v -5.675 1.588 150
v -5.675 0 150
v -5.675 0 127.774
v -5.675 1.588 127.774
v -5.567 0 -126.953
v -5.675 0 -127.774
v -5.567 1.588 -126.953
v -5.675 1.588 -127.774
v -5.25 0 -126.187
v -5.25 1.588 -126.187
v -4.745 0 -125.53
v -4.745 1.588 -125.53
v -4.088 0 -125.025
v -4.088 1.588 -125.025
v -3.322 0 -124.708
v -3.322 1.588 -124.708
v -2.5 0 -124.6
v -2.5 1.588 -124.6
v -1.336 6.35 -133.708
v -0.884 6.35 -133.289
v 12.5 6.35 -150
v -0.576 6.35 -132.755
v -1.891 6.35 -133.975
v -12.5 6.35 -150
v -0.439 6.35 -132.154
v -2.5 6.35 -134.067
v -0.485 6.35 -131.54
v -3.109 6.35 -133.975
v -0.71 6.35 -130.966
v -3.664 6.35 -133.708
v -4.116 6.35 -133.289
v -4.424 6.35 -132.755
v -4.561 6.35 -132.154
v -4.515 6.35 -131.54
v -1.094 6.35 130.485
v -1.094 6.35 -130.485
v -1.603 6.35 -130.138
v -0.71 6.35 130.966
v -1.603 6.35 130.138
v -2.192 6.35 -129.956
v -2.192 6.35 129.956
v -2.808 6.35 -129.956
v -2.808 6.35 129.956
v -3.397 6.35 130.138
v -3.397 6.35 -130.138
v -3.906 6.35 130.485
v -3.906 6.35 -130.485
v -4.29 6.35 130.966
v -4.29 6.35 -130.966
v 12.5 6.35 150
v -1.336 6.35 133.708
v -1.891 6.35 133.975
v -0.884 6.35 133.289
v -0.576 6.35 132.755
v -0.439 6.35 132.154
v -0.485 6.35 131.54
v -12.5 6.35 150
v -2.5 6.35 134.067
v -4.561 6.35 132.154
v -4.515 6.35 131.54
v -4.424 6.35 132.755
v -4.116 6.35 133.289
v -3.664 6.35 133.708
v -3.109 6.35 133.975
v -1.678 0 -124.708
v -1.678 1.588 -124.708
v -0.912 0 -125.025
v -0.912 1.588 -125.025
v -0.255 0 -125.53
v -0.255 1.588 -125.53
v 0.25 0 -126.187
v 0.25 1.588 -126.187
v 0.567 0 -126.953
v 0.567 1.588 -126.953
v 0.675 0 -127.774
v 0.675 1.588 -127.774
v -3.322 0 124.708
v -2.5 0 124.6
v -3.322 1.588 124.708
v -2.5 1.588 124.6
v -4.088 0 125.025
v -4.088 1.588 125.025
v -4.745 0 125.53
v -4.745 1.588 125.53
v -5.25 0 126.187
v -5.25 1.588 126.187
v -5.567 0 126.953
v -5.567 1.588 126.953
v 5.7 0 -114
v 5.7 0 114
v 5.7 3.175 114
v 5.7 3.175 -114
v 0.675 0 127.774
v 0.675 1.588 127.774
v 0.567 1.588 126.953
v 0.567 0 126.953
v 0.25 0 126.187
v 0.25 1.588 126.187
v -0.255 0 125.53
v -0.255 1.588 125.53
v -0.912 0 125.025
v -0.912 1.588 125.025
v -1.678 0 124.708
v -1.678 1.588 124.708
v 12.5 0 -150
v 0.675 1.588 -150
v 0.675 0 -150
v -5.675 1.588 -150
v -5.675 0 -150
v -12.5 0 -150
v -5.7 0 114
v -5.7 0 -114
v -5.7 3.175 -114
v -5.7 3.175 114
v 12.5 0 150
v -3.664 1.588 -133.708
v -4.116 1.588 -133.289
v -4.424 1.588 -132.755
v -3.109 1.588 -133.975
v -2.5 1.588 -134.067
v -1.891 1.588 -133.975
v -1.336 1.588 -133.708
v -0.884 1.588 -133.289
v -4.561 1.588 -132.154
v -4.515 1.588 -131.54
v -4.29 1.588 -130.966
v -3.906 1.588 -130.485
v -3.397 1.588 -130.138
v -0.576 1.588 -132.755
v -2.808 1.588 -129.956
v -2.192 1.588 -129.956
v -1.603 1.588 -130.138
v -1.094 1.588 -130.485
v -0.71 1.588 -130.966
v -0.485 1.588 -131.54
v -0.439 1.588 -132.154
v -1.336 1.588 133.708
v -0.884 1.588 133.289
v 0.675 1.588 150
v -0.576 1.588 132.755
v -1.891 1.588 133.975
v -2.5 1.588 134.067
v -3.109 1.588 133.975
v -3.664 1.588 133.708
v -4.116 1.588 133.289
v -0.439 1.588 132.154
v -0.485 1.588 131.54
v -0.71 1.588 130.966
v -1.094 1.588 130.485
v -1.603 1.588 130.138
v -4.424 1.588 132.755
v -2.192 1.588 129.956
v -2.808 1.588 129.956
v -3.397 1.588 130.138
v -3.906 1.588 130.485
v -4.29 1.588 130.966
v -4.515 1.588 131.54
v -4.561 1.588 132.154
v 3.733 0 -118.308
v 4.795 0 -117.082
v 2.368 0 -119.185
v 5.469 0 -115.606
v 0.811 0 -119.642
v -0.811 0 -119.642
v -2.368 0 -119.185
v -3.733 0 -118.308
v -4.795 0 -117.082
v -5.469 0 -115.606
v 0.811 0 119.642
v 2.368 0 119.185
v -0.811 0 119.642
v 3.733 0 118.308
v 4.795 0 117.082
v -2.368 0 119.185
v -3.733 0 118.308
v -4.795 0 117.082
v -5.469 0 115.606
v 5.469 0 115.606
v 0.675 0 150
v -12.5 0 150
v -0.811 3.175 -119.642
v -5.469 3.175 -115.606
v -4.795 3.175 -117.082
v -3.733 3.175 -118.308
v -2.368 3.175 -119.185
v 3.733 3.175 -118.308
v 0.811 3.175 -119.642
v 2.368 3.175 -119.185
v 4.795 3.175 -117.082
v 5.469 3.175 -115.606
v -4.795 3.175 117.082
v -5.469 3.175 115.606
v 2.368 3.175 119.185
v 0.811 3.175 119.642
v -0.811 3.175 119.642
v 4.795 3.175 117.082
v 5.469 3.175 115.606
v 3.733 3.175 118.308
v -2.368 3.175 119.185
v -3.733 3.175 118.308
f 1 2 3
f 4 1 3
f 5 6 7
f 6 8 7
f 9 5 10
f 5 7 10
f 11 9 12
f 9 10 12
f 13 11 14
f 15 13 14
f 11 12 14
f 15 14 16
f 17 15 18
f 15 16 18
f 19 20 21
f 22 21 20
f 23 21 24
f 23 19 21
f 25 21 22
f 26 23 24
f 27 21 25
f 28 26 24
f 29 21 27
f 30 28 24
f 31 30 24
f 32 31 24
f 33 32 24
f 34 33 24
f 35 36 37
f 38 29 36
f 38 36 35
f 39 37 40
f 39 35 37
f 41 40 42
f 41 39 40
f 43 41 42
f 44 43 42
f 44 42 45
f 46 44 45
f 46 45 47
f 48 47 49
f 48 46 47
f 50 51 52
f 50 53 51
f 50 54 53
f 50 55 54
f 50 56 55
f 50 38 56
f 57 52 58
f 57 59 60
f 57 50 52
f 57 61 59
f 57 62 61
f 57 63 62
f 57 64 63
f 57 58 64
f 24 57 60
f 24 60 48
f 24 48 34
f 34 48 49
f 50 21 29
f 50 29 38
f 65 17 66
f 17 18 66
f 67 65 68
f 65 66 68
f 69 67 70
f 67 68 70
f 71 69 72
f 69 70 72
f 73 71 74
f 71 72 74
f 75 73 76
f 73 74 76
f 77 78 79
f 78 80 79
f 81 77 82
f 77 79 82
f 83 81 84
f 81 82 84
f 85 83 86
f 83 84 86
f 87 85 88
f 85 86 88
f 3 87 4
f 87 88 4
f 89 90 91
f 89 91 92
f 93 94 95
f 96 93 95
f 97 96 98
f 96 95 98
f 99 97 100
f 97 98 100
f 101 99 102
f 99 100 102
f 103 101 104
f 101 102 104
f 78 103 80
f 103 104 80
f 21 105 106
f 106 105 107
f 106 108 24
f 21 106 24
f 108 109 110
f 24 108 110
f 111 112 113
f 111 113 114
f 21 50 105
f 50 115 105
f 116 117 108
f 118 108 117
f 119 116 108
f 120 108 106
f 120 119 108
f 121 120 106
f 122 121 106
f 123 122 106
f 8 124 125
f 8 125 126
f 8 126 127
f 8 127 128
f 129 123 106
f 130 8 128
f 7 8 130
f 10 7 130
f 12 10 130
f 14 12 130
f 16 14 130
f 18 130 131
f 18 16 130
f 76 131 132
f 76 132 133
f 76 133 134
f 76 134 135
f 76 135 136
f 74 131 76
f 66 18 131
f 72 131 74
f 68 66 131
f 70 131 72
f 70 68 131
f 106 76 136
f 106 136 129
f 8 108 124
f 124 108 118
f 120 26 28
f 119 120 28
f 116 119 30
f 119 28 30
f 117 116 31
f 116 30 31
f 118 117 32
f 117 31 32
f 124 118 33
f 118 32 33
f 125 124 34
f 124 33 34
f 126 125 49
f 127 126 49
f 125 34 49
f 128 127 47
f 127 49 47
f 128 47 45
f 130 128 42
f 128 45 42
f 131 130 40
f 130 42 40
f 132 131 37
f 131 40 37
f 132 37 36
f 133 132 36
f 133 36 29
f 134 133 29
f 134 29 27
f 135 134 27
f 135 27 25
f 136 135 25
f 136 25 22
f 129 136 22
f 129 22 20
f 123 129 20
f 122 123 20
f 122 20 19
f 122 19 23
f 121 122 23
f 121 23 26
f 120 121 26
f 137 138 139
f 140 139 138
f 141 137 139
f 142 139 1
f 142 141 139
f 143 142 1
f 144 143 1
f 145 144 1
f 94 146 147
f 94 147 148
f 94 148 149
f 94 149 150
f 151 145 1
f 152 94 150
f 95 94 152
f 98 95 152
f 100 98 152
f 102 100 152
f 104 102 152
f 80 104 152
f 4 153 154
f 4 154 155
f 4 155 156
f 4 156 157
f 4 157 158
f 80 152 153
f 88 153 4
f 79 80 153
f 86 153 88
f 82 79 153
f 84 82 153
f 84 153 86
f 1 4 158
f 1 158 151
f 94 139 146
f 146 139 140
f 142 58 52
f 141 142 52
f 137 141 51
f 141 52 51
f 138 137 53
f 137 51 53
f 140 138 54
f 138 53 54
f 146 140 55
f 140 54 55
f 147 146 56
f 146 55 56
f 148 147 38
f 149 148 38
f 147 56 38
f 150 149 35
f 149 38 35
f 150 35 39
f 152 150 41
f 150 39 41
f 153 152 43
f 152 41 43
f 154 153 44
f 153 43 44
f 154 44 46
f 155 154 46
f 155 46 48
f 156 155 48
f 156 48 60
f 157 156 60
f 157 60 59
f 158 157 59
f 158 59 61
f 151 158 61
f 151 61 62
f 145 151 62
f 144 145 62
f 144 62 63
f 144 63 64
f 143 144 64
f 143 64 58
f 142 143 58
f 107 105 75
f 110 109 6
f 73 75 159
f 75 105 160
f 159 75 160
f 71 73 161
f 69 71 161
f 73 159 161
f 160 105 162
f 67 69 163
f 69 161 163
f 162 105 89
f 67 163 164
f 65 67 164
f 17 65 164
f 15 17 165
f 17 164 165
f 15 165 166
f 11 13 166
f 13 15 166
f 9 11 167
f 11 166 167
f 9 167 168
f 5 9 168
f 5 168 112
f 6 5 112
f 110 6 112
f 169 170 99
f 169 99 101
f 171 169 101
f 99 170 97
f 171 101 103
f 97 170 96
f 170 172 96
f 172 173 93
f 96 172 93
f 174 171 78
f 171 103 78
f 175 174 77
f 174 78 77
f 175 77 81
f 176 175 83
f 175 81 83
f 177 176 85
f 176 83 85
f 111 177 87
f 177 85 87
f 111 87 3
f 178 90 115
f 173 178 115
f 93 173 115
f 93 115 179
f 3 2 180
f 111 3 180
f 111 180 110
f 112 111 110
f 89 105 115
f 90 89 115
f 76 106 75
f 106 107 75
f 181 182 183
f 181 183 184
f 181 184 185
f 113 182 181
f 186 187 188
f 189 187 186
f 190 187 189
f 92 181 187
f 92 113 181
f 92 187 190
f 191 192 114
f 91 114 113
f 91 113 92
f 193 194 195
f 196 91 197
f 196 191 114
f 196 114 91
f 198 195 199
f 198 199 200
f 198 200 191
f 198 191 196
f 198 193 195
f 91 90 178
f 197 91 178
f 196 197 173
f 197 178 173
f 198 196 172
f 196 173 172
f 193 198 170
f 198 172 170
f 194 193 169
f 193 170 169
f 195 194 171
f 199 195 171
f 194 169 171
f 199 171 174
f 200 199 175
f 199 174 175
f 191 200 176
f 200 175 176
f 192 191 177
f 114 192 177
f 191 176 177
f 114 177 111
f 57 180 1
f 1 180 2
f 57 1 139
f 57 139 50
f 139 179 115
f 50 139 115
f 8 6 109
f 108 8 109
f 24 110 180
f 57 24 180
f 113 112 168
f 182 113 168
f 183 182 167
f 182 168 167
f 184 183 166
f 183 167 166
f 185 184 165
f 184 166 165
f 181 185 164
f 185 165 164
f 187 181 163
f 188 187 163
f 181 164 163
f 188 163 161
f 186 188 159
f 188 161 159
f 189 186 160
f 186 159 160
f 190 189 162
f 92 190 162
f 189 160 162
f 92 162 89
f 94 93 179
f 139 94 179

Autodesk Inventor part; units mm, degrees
ref_plane "YZ Plane" through (0, 0, 0) normal (1, 0, 0) x (0, 1, 0)
ref_plane "XZ Plane" through (0, 0, 0) normal (0, 1, 0) x (-1, 0, 0)
ref_plane "XY Plane" through (0, 0, 0) normal (0, 0, 1) x (1, 0, 0)
sketch "Sketch1" plane through (0, 0, 0) normal (0, 1, 0) x (-1, 0, 0)
  line L0 (-5.7, -114) -> (5.7, -114)
  line L1 (5.7, -114) -> (5.7, 114)
  line L2 (5.7, 114) -> (-5.7, 114)
  line L3 (-5.7, 114) -> (-5.7, -114)
  line L4 (-5.7, -114) -> (5.7, 114) construction
  line L5 (5.7, -114) -> (-5.7, 114) construction
  line L6 (-12.5, -150) -> (12.5, -150)
  line L7 (12.5, -150) -> (12.5, 150)
  line L8 (12.5, 150) -> (-12.5, 150)
  line L9 (-12.5, 150) -> (-12.5, -150)
  line L10 (-12.5, -150) -> (12.5, 150) construction
  line L11 (12.5, -150) -> (-12.5, 150) construction
  point P0 (0, 0)
  dimension "d0" = 11.4
  dimension "d1" = 228
  dimension "d2" = 300
  dimension "d3" = 25
extrude "Extrusion1" add sketch "Sketch1" along normal blind 6.35
sketch "Sketch2" plane through (0, 6.35, 0) normal (0, 1, 0) x (1, 0, 0)
  line L0 (5.7, 114) -> (5.7, -114) projected
  line L1 (5.7, -114) -> (-5.7, -114) projected
  line L2 (-5.7, -114) -> (-5.7, 114) projected
  line L3 (-5.7, 114) -> (5.7, 114) projected
  line L4 (12.5, 150) -> (-12.5, 150) projected
  line L5 (-12.5, 150) -> (-12.5, -150) projected
  line L6 (-12.5, -150) -> (12.5, -150) projected
  line L7 (12.5, -150) -> (12.5, 150) projected
  point P0 (0, 0)
extrude "Extrusion2" add sketch "Sketch2" against normal blind 3.175 contours L0 L1 L2 L3
sketch "Sketch3" plane through (0, 0, 0) normal (0, -1, 0) x (1, 0, 0)
  line L0 (5.7, 114) -> (5.7, -114) projected
  line L1 (5.7, -114) -> (-5.7, -114) projected
  line L2 (-5.7, -114) -> (-5.7, 114) projected
  line L3 (-5.7, 114) -> (5.7, 114) projected
  line L4 (12.5, -150) -> (-12.5, -150) projected
  line L5 (12.5, 150) -> (12.5, -150) projected
  line L6 (-12.5, 150) -> (12.5, 150) projected
  line L7 (-12.5, -150) -> (-12.5, 150) projected
  point P0 (0, 0)
  point P1 (-2.5, -132)
  dimension "d8" = 18
  dimension "d36" = 10
hole "Hole1" at (-2.5, 0, -132) direction (0, 1, 0) diameter 4.134 depth 14.2 tip angle 118 thread size "M5x0.8" class "6H" standard "ANSI Metric M Profile"
sketch "Sketch4" plane through (0, 0, 0) normal (0, -1, 0) x (1, 0, 0)
  circle A0 centre (-2.5, -132) radius 2.067 projected
  line L0 (5.7, 114) -> (5.7, -114) projected
  line L1 (5.7, -114) -> (-5.7, -114) projected
  line L2 (-5.7, -114) -> (-5.7, 114) projected
  line L3 (-5.7, 114) -> (5.7, 114) projected
  line L4 (12.5, -150) -> (-12.5, -150) projected
  line L5 (12.5, 150) -> (12.5, -150) projected
  line L6 (-12.5, 150) -> (12.5, 150) projected
  line L7 (-12.5, -150) -> (-12.5, 150) projected
  line L8 (-5.675, -150) -> (0.675, -150)
  line L9 (0.675, -150) -> (0.675, -124.6)
  line L10 (0.675, -124.6) -> (-5.675, -124.6)
  line L11 (-5.675, -124.6) -> (-5.675, -150)
  line L12 (-2.5, -124.6) -> (-2.5, -132) construction
  point P0 (0, 0)
  dimension "d17" = 6.35
  dimension "d18" = 25.4
extrude "Extrusion3" cut sketch "Sketch4" against normal blind 1.5875 contours L4 L11 L10 L9
fillet "Fillet1" radius 3.175 2 edges at (-5.675, 0.7937, -124.6) (0.675, 0.7937, -124.6)
mirror "Mirror1" about plane through (0, 0, 0) normal (0, 0, 1) of "Hole1", "Extrusion3", "Fillet1"
sketch "Sketch7" plane through (0, 0, 0) normal (0, -1, 0) x (1, 0, 0)
  line L0 (5.7, 114) -> (5.7, -114) projected
  line L1 (5.7, -114) -> (-5.7, -114) projected
  line L2 (-5.7, -114) -> (-5.7, 114) projected
  line L3 (-5.7, 114) -> (5.7, 114) projected
  line L4 (0.675, 150) -> (0.675, 127.775) projected
  arc A0 (-5.675, 127.775) -> (0.675, 127.775) centre (-2.5, 127.775) ccw projected
  line L5 (-5.675, 127.775) -> (-5.675, 150) projected
  line L6 (-12.5, 150) -> (-5.675, 150) projected
  line L7 (-12.5, -150) -> (-12.5, 150) projected
  line L8 (-5.675, -150) -> (-12.5, -150) projected
  line L9 (-5.675, -150) -> (-5.675, -127.775) projected
  arc A1 (0.675, -127.775) -> (-5.675, -127.775) centre (-2.5, -127.775) ccw projected
  line L10 (0.675, -127.775) -> (0.675, -150) projected
  line L11 (12.5, -150) -> (0.675, -150) projected
  line L12 (12.5, 150) -> (12.5, -150) projected
  line L13 (0.675, 150) -> (12.5, 150) projected
  line L14 (-5.7, 114) -> (5.7, 114) projected
  arc A2 (5.7, 114) -> (-5.7, 114) centre (0, 114) ccw
  line L15 (-5.7, -114) -> (-5.7, 114) projected
  arc A3 (-5.7, -114) -> (5.7, -114) centre (0, -114) ccw
  line L16 (5.7, 114) -> (5.7, -114) projected
  point P0 (0, 0)
extrude "Extrusion5" cut sketch "Sketch7" against normal up to surface (3.175 mm away) contours L3 A2 | A3 L1
equation "\"d0\" = 2 * rubberizedCoating + ScintillatorWidth + 2 * silveringThickness"
equation "\"d1\" = 20 * d0"
equation "\"d4\" = mppcMountDepth"
equation "\"d6\" = 0.5 * mppcMountDepth"
equation "\"silveringThickness\" = 0.2"
equation "\"rubberizedCoating\" = 0.5"
equation "\"mppcMountDepth\" = 6.35"
equation "\"OpticalFiberDiameter\" = 1"
equation "\"OpticalFiberClearence\" = 0.1"
equation "\"ScintillatorEdgeClearence\" = 3"
equation "\"ShallowTrackDepth\" = 1.2"
equation "\"DeepTrackDepth\" = 5.6"
equation "\"FiberEdgeOffsett\" = 5"
equation "\"LoopLargeTrackRatio\" = 1.1"
equation "\"FiberSensorClerence\" = 0.5"
equation "\"MountingScrewOffsett\" = 9"
equation "\"ScintillatorWidth\" = 10"
properties part number "mppcMountClamp" material "Aluminum 6061"
